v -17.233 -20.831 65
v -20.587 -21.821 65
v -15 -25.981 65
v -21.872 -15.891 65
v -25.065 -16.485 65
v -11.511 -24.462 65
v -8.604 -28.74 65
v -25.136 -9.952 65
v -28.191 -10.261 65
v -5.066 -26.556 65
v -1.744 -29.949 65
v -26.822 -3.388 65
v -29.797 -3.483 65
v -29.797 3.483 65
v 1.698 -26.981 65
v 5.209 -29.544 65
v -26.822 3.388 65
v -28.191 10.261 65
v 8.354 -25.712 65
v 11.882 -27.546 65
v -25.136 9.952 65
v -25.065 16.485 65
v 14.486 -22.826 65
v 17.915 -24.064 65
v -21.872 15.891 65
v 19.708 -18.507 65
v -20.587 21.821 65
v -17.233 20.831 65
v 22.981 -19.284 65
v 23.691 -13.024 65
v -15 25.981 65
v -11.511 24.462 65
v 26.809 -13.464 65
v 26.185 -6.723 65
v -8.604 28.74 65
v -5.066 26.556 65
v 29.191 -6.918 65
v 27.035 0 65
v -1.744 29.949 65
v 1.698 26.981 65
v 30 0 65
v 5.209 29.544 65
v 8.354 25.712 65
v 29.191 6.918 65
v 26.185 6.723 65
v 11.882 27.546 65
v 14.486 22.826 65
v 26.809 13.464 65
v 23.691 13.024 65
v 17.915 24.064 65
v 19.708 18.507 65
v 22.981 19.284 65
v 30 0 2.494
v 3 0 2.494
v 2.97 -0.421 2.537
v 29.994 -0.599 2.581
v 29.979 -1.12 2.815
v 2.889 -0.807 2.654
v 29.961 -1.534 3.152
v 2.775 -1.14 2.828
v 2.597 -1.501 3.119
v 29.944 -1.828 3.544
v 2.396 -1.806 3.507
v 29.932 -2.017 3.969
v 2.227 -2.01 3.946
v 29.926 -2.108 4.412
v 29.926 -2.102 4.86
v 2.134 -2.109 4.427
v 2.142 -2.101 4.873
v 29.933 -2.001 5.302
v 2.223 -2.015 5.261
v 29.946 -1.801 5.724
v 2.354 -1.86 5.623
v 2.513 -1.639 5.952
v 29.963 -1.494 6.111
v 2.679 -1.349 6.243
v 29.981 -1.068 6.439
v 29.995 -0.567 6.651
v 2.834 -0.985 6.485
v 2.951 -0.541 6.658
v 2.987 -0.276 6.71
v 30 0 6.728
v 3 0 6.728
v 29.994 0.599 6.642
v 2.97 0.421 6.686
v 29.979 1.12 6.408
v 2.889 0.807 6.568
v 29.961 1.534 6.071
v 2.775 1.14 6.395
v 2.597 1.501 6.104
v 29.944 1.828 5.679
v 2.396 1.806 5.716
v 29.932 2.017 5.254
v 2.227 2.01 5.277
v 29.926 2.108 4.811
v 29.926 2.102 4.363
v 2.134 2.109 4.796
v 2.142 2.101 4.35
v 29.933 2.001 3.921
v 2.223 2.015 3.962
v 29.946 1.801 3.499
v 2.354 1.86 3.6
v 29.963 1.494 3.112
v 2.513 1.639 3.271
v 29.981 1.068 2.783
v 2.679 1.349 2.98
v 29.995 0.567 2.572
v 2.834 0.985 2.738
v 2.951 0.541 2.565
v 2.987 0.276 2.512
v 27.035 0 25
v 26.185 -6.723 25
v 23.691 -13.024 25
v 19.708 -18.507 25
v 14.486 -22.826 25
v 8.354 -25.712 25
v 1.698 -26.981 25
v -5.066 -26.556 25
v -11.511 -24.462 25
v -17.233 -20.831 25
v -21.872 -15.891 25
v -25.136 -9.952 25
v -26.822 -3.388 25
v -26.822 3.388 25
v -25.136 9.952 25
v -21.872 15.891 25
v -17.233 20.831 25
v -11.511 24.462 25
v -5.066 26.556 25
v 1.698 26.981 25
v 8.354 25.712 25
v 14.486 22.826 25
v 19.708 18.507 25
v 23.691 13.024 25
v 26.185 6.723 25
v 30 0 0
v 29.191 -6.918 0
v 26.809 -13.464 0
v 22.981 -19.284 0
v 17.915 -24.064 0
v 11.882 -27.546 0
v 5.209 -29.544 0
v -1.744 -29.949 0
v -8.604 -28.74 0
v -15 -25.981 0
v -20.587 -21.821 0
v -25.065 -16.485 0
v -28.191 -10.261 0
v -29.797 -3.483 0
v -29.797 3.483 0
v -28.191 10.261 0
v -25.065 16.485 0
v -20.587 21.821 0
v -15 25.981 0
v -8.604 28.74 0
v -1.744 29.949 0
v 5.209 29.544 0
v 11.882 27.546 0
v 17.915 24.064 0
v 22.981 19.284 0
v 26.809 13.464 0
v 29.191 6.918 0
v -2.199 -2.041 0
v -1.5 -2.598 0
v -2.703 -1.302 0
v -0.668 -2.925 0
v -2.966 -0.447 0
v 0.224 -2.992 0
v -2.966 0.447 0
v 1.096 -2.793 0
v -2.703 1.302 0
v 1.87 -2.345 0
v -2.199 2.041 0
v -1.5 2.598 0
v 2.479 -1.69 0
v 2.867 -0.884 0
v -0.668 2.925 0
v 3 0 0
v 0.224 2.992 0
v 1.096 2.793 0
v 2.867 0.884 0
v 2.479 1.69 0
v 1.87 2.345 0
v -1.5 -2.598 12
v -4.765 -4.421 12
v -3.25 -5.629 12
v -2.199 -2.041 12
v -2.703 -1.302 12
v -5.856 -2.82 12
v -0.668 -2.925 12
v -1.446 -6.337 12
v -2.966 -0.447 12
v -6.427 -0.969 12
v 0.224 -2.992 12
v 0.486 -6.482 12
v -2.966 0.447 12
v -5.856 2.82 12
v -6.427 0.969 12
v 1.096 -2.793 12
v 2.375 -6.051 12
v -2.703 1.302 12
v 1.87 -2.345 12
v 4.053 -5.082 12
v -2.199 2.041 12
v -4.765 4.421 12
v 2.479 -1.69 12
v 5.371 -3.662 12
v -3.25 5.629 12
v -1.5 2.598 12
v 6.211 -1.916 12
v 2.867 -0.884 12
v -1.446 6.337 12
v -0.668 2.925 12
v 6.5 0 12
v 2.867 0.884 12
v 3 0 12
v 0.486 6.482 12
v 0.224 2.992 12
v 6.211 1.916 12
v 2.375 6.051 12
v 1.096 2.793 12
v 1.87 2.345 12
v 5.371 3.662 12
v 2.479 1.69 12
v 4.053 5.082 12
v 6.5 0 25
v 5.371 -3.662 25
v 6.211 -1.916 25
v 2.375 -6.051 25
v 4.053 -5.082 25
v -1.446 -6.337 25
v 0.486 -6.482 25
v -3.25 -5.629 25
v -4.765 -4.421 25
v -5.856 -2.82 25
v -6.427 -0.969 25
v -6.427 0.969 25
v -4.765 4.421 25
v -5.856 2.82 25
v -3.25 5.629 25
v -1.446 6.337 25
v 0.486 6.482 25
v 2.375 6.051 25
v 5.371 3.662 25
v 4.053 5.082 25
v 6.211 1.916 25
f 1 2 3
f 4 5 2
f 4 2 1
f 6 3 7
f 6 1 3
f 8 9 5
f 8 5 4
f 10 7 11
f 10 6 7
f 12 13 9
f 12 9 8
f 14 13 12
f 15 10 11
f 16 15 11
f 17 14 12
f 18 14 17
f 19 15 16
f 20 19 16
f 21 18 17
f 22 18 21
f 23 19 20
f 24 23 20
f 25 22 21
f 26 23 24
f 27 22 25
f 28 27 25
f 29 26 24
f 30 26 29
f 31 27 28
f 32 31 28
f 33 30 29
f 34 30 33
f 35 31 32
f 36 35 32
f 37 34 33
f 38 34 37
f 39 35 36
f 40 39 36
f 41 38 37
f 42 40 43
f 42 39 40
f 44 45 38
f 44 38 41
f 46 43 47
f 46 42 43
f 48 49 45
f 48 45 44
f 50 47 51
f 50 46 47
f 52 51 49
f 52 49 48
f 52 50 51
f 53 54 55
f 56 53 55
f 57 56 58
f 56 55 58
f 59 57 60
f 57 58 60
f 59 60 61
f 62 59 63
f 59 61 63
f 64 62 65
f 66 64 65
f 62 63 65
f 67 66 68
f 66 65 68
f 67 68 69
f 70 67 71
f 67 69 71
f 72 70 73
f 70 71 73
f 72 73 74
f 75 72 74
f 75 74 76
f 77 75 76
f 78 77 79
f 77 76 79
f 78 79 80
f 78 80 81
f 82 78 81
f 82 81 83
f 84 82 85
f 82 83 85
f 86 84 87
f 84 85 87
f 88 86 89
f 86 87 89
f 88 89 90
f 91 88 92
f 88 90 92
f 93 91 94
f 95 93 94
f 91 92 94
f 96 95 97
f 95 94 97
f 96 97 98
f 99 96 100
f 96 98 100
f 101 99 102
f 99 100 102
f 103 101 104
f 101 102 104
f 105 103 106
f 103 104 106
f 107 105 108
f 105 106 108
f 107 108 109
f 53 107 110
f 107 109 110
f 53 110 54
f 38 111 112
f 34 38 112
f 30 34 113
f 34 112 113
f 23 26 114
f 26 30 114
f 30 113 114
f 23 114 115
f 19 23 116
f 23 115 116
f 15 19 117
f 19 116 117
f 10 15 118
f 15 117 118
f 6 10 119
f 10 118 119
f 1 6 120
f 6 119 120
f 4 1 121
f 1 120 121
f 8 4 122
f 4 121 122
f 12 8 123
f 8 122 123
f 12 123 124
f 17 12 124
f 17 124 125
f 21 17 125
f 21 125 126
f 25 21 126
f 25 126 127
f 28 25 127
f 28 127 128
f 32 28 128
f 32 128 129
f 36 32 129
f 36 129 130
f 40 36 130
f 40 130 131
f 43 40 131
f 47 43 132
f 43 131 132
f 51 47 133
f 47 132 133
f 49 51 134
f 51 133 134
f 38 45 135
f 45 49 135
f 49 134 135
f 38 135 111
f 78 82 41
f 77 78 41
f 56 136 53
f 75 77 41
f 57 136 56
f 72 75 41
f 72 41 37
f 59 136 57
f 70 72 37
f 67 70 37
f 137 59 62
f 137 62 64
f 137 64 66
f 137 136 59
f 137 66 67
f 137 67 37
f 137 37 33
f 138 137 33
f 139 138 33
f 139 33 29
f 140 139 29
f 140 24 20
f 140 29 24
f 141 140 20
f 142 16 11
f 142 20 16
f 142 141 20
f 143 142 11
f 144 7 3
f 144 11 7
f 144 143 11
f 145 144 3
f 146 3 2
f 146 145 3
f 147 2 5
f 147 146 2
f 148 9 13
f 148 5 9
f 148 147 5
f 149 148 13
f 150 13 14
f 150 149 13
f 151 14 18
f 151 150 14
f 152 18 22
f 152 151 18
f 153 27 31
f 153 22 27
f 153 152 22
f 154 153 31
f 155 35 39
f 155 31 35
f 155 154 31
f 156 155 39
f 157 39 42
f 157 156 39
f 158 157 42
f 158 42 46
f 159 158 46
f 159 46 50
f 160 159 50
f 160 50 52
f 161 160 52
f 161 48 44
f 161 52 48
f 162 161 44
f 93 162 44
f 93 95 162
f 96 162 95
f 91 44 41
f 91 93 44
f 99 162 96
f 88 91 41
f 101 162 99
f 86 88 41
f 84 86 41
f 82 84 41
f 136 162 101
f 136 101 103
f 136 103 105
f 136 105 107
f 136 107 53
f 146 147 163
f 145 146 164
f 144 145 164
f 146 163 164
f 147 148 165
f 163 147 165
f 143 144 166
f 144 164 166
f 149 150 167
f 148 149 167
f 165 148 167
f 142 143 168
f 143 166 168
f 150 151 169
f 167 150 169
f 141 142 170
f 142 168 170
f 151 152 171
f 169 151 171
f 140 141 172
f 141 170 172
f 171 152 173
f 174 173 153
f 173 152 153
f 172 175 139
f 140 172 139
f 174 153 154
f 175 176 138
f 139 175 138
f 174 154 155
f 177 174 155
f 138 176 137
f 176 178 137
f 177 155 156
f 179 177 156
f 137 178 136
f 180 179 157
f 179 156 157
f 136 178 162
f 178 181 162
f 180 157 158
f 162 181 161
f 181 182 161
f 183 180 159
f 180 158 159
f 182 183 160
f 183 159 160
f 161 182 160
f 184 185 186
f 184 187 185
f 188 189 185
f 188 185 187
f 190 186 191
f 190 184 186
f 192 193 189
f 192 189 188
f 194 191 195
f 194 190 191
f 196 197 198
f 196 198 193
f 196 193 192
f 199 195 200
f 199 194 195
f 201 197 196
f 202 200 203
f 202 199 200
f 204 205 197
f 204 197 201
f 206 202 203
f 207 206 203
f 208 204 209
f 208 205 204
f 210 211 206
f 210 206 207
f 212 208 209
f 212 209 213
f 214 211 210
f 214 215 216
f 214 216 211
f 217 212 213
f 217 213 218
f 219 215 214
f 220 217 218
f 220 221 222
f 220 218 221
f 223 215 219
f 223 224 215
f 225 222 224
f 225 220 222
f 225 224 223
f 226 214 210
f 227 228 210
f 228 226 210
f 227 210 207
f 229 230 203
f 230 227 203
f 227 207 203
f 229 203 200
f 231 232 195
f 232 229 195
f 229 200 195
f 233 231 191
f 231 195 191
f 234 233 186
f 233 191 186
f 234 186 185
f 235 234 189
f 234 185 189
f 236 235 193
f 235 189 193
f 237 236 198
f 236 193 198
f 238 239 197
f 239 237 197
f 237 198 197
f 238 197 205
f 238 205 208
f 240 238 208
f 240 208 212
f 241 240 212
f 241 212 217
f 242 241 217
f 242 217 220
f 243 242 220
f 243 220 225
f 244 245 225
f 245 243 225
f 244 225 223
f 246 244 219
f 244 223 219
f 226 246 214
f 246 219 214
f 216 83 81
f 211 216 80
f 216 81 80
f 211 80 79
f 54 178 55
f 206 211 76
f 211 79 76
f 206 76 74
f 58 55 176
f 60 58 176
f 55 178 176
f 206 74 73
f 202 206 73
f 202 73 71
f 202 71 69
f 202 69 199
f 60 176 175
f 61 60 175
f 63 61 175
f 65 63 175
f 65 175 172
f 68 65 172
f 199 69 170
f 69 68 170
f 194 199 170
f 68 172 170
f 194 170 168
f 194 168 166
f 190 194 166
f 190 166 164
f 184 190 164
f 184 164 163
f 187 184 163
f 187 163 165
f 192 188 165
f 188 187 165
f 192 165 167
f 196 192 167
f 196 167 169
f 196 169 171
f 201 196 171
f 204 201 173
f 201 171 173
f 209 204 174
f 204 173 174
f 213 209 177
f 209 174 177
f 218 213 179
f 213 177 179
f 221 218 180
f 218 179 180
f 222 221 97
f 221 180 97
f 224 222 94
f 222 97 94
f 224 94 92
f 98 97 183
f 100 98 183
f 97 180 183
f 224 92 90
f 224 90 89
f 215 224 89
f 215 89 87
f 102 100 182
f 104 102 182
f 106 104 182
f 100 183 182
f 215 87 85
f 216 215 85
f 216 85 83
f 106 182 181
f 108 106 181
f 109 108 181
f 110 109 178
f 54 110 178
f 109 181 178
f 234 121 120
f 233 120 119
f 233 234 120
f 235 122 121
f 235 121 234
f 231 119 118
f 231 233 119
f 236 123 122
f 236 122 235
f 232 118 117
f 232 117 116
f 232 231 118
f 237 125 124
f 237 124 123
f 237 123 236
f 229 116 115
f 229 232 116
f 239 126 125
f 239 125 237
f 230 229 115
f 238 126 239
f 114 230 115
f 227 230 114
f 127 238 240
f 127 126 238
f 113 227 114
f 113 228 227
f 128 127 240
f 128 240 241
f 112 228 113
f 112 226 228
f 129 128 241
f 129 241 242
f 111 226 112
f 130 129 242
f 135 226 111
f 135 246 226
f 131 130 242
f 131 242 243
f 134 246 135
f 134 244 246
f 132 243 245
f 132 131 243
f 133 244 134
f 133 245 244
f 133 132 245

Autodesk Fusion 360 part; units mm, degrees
sketch "Boceto1" plane through (0, 0, 0) normal (1, 0, 0) x (0, 1, 0)
sketch "Boceto2" plane through (0, 0, 0) normal (0, 0, 1) x (1, 0, 0)
  circle A0 centre (0, 0) radius 30
  circle A1 centre (0, 0) radius 3
  circle A2 centre (0, 0) radius 6.5
  line L0 (0, -30) -> (0.4326, -27.0314) construction
  circle A3 centre (0, 0) radius 27.0348
  dimension "d1" = 60
  dimension "d2" = 6
  dimension "d3" = 13
  dimension "d4" = 3
extrude "Extruir1" add sketch "Boceto2" along normal blind 12 contours A2
extrude "Extruir3" add sketch "Boceto2" along normal blind 25 contours A3
extrude "Extruir4" add sketch "Boceto2" along normal blind 65 contours A0
hole "Agujero1" at (30, 0, 4.6114) direction (-1, 0, 0) diameter 4.234 depth 29 tip angle 180
extrude "Extruir2" [suppressed]
